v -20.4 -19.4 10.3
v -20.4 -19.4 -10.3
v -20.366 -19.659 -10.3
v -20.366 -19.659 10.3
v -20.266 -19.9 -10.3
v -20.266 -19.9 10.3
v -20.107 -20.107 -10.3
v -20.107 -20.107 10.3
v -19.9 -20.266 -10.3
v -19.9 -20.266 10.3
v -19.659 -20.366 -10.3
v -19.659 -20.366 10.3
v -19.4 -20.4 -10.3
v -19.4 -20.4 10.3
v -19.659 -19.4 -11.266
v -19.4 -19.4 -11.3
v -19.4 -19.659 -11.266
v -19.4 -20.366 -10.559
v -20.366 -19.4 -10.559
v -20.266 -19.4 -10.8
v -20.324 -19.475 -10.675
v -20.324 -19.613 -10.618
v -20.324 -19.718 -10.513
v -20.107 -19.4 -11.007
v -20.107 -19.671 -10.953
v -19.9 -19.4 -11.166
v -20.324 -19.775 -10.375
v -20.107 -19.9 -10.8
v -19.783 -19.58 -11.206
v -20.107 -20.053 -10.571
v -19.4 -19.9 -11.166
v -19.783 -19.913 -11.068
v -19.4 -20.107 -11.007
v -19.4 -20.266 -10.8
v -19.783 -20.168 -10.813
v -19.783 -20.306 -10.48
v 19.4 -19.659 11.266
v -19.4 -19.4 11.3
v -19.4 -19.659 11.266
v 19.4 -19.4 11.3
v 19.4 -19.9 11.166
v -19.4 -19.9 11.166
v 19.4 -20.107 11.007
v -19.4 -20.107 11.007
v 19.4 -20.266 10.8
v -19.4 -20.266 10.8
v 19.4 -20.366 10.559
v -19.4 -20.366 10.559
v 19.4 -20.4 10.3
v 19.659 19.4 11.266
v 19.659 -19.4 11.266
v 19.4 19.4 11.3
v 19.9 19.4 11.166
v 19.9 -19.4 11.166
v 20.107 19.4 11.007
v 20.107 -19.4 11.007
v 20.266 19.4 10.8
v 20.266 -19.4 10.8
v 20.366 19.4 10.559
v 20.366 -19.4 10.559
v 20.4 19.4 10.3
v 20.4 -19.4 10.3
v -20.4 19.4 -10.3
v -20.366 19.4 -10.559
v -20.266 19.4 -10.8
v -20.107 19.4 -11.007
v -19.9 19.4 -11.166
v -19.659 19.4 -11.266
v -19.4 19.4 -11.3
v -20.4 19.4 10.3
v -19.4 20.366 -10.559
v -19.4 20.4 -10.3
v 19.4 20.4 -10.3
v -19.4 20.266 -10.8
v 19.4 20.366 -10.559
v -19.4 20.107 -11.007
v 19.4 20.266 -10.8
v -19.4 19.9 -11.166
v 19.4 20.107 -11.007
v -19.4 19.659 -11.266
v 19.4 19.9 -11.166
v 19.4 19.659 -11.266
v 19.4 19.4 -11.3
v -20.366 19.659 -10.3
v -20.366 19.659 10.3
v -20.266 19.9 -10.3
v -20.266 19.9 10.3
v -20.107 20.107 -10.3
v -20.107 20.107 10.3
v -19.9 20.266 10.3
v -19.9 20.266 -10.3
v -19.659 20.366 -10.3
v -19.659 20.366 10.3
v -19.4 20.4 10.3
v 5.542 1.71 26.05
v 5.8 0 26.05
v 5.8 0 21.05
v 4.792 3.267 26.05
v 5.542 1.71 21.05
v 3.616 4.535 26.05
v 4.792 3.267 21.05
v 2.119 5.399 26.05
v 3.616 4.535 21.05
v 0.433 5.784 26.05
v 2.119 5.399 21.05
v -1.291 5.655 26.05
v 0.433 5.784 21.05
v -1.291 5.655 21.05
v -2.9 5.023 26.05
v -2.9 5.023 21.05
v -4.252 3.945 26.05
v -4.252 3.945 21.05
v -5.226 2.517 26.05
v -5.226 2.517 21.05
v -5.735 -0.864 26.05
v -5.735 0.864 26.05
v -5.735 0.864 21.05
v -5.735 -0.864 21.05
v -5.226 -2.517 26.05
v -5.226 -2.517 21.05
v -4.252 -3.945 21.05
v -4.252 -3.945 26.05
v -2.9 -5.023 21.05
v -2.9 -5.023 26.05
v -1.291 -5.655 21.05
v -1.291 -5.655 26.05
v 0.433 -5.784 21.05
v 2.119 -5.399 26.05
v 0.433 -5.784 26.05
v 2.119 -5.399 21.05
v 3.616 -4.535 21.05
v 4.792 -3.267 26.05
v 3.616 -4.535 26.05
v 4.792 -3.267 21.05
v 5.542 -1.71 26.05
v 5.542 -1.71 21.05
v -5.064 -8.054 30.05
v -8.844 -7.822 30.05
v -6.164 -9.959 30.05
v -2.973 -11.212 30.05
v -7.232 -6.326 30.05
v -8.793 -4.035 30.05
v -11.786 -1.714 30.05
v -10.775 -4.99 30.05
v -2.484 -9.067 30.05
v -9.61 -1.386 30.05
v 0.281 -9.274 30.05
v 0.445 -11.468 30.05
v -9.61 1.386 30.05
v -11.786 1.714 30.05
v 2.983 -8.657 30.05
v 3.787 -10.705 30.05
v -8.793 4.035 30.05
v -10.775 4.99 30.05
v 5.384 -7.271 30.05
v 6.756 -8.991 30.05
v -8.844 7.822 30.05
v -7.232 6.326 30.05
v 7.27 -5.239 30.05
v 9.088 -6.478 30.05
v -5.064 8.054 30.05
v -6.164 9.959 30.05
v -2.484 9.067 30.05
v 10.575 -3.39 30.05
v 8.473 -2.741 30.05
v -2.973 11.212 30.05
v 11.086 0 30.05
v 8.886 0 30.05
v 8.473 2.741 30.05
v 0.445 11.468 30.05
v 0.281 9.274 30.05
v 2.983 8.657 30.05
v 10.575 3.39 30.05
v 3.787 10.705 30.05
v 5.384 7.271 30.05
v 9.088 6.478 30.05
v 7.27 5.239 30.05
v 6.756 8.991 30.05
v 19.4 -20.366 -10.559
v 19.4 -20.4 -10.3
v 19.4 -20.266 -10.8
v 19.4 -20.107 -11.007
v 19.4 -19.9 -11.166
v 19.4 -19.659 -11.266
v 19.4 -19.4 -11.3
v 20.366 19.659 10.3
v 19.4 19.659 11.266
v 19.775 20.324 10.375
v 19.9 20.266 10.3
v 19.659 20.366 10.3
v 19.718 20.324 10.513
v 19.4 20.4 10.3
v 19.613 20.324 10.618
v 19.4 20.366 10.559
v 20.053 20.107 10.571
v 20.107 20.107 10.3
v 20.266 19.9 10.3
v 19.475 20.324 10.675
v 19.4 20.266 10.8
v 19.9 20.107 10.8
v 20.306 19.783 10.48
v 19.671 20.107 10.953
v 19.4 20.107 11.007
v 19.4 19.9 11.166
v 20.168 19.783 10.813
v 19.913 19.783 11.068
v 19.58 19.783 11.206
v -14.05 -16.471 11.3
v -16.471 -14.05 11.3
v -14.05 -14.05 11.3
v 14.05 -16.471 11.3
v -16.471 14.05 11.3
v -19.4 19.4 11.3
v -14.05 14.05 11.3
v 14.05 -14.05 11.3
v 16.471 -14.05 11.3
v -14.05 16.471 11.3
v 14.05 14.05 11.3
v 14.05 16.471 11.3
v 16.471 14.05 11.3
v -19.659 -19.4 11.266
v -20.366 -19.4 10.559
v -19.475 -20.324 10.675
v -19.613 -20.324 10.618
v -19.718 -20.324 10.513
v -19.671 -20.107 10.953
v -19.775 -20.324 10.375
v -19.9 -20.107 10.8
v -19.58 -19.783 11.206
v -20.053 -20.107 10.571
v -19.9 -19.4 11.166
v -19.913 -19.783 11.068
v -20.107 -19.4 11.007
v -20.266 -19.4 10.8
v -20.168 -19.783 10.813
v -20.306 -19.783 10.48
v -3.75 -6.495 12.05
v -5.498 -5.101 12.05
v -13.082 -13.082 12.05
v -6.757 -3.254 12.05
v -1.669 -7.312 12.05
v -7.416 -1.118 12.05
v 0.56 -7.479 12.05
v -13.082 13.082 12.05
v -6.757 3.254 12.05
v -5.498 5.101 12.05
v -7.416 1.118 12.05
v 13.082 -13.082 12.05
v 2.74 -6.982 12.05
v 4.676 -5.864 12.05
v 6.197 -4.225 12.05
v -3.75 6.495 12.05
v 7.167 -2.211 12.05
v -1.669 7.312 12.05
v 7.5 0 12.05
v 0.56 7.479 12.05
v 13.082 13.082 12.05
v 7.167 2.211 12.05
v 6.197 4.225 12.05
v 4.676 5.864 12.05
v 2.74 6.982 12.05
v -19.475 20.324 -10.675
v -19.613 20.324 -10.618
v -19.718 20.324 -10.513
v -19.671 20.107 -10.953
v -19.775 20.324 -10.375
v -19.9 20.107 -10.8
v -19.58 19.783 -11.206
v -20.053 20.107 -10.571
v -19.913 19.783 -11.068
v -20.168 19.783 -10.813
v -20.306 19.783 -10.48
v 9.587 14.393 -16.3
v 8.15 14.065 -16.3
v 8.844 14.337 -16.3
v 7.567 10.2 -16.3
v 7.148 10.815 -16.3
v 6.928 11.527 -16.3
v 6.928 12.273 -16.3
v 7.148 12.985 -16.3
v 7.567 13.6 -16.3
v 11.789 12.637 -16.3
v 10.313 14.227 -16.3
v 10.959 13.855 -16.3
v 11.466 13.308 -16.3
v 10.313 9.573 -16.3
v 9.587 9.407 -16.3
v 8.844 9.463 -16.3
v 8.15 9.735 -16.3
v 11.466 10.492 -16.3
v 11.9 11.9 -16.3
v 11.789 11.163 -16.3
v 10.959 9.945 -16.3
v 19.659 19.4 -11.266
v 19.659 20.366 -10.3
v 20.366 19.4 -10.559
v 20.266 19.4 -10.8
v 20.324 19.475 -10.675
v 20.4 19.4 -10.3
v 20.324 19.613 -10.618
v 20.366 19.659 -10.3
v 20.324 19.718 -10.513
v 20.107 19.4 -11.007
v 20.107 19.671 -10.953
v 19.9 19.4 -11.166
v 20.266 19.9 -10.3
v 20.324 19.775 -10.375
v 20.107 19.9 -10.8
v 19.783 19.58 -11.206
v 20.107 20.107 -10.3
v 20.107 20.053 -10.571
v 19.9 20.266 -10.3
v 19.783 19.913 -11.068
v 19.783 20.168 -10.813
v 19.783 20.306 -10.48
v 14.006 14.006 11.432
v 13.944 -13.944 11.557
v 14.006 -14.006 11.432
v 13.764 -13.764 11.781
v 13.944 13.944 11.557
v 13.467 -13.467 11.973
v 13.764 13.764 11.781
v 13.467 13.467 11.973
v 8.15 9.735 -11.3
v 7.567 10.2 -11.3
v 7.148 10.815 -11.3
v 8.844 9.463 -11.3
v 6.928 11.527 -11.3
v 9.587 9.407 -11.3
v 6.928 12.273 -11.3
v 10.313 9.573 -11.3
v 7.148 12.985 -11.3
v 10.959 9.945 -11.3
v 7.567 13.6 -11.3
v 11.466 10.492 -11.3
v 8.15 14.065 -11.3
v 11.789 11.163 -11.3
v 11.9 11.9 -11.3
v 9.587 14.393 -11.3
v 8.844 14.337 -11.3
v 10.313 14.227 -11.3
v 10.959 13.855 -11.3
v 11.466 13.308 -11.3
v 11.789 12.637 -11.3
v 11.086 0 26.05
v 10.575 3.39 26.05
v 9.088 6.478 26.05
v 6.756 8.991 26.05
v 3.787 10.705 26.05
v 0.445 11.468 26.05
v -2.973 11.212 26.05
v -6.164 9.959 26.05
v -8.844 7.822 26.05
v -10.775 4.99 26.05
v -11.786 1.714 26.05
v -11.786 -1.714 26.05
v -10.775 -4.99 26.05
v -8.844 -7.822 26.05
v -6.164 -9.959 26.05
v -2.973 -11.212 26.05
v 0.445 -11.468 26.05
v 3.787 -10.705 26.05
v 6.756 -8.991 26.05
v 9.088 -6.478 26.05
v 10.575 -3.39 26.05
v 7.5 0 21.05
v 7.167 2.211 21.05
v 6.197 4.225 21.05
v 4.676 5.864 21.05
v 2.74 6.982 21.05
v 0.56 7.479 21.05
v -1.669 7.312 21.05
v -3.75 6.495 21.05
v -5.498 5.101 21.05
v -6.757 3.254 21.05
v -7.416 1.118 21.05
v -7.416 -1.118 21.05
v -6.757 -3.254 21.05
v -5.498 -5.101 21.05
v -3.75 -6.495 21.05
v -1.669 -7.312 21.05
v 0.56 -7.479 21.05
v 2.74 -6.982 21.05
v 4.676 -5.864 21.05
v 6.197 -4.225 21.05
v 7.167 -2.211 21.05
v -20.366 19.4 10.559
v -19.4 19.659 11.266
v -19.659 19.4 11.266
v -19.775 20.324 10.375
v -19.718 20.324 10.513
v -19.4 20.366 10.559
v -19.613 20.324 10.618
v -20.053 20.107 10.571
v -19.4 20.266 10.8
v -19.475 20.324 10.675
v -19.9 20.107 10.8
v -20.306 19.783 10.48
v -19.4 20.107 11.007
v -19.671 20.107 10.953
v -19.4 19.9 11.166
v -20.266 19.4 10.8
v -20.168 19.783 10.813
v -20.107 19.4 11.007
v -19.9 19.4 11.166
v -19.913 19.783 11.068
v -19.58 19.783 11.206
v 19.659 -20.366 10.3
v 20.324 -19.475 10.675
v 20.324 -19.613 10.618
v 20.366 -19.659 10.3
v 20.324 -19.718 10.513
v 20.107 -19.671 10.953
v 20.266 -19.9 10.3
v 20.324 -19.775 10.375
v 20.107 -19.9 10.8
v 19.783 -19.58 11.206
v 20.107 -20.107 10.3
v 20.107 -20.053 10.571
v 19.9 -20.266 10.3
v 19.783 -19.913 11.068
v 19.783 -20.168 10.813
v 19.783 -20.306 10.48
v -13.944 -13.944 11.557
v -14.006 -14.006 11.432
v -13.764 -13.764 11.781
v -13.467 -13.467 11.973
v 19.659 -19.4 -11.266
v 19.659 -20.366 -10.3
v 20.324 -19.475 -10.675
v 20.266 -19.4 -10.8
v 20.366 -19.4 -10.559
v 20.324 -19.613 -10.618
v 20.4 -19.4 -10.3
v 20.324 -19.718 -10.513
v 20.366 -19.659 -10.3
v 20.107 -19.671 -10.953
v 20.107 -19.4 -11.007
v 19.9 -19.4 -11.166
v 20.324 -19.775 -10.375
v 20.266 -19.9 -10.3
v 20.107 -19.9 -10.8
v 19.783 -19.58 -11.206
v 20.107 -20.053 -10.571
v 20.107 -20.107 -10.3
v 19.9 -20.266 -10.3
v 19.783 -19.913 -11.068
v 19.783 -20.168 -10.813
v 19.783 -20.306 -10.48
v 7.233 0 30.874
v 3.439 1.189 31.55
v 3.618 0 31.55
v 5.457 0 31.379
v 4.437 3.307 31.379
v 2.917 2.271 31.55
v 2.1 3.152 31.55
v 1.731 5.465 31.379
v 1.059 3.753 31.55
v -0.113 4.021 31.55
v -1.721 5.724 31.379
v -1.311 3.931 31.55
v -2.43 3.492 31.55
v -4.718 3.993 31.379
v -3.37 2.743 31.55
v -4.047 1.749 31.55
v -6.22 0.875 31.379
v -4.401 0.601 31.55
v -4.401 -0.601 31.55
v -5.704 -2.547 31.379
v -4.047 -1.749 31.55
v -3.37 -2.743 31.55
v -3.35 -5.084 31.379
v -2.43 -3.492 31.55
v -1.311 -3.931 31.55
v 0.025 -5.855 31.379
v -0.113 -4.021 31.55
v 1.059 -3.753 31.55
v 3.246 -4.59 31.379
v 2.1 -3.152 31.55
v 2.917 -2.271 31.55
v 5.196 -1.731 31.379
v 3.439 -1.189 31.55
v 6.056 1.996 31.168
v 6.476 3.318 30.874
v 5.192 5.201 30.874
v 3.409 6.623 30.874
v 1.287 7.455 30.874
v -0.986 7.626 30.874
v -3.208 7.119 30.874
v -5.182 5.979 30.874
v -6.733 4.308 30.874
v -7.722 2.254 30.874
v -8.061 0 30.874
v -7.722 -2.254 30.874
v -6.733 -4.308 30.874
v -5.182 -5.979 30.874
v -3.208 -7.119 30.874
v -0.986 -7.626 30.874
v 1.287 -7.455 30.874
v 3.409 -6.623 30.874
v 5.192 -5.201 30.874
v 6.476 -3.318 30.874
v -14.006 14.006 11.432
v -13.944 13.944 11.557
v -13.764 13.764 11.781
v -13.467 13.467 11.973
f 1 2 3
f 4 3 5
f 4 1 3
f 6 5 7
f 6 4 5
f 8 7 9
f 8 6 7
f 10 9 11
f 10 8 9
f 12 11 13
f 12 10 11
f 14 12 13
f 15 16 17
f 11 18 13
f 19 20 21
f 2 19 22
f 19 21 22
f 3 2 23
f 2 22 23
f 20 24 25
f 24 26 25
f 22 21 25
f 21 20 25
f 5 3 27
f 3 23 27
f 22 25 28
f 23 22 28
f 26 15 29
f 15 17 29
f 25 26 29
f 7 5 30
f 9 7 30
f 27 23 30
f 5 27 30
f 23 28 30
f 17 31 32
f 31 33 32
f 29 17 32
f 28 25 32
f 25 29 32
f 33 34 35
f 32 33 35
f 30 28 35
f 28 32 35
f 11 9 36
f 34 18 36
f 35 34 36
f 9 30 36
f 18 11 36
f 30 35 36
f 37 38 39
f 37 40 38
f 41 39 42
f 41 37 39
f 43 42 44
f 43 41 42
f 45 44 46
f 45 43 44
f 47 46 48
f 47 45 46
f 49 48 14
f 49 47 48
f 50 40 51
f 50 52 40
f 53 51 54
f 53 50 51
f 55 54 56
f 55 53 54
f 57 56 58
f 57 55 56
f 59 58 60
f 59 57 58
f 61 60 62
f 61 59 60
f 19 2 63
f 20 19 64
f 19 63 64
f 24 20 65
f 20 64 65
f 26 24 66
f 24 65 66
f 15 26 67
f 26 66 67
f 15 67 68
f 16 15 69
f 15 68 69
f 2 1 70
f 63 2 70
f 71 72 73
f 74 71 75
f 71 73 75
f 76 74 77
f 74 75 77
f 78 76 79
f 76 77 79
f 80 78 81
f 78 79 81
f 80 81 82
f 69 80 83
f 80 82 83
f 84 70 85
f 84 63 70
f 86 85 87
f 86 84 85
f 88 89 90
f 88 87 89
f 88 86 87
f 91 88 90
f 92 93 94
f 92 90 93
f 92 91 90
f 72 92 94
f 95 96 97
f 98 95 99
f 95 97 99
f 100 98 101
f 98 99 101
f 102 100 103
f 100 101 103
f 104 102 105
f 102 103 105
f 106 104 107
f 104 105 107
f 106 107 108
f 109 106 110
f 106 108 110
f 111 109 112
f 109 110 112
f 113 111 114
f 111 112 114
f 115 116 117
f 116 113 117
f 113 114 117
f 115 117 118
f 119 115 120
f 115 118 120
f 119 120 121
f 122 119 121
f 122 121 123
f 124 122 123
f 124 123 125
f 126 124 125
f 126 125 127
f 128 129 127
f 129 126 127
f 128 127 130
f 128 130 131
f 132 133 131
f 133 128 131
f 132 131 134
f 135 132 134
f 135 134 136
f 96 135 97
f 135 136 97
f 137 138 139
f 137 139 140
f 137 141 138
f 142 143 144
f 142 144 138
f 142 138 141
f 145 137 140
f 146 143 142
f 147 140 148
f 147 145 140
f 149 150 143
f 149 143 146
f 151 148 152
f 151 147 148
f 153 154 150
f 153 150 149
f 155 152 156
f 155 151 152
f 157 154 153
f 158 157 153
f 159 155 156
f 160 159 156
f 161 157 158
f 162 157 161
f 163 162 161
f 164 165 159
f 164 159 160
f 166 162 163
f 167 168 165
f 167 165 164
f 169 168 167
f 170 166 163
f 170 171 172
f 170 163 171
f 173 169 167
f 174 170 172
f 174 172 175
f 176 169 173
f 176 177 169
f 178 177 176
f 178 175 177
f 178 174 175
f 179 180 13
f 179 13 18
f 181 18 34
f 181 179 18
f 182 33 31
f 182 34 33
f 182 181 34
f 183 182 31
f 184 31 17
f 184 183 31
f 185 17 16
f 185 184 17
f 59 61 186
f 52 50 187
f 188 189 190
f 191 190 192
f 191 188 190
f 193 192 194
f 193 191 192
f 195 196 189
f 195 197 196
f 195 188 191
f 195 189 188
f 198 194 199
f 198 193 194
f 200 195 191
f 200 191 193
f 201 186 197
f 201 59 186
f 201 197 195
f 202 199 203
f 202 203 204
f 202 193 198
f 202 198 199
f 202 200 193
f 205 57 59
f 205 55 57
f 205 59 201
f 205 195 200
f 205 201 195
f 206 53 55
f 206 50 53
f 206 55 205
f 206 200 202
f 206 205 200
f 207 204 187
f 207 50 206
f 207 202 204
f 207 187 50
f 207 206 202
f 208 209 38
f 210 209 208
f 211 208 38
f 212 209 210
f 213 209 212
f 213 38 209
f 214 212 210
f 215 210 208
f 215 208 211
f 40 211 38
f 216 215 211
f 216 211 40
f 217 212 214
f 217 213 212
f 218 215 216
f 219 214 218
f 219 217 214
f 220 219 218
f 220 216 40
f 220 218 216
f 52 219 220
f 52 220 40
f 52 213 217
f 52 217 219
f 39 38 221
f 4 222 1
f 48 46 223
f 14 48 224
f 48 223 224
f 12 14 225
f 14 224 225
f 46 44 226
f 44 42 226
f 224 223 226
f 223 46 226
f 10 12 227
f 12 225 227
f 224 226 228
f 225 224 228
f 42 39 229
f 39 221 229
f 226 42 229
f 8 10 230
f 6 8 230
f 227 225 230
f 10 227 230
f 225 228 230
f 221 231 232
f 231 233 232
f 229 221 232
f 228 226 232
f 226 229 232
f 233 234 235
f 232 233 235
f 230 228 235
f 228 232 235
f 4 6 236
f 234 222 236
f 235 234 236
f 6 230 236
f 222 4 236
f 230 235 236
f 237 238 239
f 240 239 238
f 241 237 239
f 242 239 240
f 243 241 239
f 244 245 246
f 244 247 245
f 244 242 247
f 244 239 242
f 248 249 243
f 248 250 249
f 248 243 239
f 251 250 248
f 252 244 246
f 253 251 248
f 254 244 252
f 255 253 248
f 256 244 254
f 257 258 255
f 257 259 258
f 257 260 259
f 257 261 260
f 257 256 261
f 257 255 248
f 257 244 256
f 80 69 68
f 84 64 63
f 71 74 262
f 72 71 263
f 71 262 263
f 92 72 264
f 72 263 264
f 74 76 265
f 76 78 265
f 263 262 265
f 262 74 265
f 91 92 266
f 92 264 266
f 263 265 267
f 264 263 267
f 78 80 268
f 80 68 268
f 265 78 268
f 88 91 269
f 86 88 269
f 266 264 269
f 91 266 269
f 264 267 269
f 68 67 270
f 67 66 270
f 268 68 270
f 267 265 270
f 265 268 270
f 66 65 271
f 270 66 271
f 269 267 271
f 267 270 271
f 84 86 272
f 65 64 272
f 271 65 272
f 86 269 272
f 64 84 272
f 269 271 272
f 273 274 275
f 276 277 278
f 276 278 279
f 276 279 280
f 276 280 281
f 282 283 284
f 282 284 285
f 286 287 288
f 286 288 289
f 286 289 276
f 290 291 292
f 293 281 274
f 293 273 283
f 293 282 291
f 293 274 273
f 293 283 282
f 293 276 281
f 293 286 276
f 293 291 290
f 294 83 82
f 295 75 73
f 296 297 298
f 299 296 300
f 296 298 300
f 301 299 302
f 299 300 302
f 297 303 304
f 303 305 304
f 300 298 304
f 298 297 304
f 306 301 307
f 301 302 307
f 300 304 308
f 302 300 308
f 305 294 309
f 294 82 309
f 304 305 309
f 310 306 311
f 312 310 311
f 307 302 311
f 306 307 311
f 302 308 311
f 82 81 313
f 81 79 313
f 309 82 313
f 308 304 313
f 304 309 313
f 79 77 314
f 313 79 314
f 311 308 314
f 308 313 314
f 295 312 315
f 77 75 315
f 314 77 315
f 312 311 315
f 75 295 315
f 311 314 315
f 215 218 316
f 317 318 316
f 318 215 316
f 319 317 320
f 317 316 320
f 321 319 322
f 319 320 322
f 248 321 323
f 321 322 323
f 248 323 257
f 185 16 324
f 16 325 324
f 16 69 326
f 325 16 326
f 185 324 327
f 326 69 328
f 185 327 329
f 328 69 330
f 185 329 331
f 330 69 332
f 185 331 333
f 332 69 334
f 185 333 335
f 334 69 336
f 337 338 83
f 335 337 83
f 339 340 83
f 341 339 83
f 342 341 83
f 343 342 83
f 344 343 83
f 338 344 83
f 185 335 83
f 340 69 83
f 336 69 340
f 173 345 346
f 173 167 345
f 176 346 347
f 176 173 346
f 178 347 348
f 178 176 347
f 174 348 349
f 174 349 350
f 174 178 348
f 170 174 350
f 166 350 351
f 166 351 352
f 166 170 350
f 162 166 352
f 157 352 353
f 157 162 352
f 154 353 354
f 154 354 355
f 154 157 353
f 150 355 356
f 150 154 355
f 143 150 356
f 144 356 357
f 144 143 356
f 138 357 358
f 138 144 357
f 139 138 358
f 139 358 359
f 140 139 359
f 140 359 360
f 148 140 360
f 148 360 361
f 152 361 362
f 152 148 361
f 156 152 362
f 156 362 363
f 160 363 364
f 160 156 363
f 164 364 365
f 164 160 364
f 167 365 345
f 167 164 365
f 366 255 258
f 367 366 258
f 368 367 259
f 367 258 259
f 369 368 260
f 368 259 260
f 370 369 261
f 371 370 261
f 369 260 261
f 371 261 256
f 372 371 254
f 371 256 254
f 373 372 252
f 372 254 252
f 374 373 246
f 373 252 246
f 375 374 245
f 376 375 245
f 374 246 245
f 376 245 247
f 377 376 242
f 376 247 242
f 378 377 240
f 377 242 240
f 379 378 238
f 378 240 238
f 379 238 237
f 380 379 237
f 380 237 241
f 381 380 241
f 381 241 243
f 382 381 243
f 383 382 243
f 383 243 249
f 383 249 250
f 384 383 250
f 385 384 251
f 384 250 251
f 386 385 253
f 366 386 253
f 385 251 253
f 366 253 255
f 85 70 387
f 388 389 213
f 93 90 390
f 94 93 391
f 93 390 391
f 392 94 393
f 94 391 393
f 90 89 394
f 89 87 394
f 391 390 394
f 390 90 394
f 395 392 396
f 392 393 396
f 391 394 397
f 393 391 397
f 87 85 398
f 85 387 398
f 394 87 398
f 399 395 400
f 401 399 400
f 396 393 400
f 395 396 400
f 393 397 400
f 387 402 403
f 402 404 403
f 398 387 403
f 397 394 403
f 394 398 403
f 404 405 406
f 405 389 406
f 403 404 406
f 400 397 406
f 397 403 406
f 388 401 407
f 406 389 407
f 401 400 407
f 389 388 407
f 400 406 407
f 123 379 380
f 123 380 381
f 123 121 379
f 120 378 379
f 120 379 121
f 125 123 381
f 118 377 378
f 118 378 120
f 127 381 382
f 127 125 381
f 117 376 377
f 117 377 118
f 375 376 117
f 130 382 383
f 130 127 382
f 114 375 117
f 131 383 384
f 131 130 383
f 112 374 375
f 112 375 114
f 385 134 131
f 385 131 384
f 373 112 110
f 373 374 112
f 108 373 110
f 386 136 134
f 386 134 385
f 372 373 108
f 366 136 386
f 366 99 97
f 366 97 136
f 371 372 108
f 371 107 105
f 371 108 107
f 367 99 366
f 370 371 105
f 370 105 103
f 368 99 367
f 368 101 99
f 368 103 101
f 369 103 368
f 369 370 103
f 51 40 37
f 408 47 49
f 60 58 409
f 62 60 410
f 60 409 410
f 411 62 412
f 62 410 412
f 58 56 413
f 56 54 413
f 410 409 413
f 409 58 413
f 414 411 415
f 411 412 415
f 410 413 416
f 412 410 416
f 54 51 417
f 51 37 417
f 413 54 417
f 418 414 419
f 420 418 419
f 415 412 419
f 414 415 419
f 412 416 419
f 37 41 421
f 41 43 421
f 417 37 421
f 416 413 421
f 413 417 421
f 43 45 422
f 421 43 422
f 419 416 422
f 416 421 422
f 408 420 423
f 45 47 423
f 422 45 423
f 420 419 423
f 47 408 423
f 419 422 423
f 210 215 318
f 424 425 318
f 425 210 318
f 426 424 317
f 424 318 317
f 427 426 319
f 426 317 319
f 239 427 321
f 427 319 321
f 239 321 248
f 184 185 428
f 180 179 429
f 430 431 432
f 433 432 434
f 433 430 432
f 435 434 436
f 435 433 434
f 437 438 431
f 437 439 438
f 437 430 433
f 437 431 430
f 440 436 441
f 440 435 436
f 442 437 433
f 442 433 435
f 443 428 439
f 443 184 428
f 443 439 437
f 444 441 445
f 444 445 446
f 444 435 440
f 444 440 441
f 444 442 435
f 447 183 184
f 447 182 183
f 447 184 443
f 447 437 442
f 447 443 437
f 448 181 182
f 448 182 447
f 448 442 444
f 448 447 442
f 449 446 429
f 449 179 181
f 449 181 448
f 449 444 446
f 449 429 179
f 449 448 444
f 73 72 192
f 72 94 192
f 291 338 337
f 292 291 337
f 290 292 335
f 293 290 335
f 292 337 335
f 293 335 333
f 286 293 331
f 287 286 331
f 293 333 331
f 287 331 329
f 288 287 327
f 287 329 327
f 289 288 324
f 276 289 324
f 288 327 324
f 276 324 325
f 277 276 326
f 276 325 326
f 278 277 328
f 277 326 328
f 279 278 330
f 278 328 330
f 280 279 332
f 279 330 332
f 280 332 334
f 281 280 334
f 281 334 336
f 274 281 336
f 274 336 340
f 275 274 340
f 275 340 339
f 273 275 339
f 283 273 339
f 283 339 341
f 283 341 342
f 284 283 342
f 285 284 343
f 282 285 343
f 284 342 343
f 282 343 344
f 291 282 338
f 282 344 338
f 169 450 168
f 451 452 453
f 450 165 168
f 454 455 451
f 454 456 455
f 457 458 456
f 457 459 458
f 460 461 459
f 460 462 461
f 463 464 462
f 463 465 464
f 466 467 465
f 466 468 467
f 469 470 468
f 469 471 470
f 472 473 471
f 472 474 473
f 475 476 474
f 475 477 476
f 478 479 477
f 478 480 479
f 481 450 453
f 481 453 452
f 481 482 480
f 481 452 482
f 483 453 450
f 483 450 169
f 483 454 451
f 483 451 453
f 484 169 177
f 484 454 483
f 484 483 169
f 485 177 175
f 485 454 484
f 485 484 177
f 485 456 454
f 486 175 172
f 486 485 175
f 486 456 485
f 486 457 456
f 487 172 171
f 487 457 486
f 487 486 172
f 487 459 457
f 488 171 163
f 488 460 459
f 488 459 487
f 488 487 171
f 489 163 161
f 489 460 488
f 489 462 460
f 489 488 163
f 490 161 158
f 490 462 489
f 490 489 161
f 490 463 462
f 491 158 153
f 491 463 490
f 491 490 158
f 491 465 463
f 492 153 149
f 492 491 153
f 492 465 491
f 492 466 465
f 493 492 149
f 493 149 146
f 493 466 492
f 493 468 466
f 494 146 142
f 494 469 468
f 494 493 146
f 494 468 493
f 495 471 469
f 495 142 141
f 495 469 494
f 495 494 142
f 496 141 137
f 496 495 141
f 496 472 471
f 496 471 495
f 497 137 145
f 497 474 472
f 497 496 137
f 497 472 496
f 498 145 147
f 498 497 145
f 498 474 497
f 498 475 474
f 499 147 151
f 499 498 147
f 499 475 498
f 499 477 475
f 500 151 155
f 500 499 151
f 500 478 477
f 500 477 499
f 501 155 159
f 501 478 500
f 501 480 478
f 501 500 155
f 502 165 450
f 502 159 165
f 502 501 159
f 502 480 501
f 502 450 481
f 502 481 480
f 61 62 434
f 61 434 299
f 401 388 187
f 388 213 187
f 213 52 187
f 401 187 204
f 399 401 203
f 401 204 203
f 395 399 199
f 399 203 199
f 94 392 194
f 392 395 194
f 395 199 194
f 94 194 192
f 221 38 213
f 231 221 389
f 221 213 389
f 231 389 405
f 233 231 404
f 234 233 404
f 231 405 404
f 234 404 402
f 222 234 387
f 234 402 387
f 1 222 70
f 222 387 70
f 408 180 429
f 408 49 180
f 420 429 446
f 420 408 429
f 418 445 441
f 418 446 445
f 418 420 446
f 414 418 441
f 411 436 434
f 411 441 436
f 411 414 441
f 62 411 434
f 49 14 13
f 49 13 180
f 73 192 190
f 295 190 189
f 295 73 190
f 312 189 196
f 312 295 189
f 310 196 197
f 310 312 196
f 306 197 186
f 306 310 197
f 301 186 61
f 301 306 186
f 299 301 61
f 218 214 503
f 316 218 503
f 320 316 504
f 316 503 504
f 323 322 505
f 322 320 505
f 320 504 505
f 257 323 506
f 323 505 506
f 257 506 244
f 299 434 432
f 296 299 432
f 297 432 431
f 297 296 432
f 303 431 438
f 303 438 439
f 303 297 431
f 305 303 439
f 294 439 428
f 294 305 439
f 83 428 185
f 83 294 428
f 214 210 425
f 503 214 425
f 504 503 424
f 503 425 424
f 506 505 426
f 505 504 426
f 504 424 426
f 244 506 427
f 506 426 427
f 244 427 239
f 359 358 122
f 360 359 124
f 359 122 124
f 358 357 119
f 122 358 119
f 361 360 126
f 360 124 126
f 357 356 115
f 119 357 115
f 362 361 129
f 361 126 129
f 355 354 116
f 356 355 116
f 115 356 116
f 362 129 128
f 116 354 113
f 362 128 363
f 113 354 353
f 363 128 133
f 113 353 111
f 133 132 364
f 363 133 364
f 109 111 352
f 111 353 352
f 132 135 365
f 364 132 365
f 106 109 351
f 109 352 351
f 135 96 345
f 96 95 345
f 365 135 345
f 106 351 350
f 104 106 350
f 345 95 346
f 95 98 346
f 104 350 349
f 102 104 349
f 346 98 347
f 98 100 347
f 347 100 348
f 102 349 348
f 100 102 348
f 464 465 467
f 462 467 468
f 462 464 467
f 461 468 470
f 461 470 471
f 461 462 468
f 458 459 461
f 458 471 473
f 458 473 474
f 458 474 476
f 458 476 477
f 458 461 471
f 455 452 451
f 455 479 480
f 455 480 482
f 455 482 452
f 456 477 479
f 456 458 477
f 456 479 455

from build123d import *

# Parameters (mm, degrees)
CROQUIS1_W              = 40.8
CROQUIS1_H              = 40.8
SALIENTE_EXTRUIR1_DEPTH = 11.3
CROQUIS2_W              = 28.1
CROQUIS2_H              = 28.1
SALIENTE_EXTRUIR2_DEPTH = 0.75
REDONDEO1_R             = 1
CROQUIS3_R              = 7.5
SALIENTE_EXTRUIR3_DEPTH = 9
CROQUIS4_R              = 5.8
SALIENTE_EXTRUIR4_DEPTH = 7
CROQUIS5_R              = 11.5
SALIENTE_EXTRUIR5_DEPTH = 2
CROQUIS6_R              = 9.3
SALIENTE_EXTRUIR6_DEPTH = 1.5
REDONDEO4_R             = 10
CROQUIS7_R              = 2.5
SALIENTE_EXTRUIR7_DEPTH = 5
REDONDEO5_R             = 1


with BuildPart() as part:
    # Croquis1 → Saliente-Extruir1 (new, symmetric)
    with BuildSketch(Plane.XY):
        Rectangle(CROQUIS1_W, CROQUIS1_H)
    extrude(amount=SALIENTE_EXTRUIR1_DEPTH, both=True)

    # Croquis2 → Saliente-Extruir2 (add, symmetric)
    with BuildSketch(Plane.XY.offset(11.3)):
        Rectangle(CROQUIS2_W, CROQUIS2_H)
    extrude(amount=SALIENTE_EXTRUIR2_DEPTH, both=True)

    # Redondeo1
    # the kernel refuses this fillet: 1 mm, written as the material it takes off along each edge
    with BuildSketch(Plane(origin=(14.05, 16.470614591, 12.05), x_dir=(0, 0, -1), z_dir=(0, -1, 0)), Plane(origin=(-16.470614591, 14.05, 12.05), x_dir=(0, 0, -1), z_dir=(1, 0, 0)), Plane(origin=(16.470614591, -14.05, 12.05), x_dir=(0, 0, -1), z_dir=(-1, 0, 0)), Plane(origin=(-14.05, -16.470614591, 12.05), x_dir=(0, 0, -1), z_dir=(0, 1, 0))) as redondeo1_piece_1:
        with BuildLine():
            CenterArc((1, -0.968245837), REDONDEO1_R, 104.477512186, 75.522487814)
            Line((0, -0.968245837), (-0.02, -0.968245837))
            Line((-0.02, -0.968245837), (-0.02, 0))
            Line((-0.02, 0), (0, 0.02))
            ThreePointArc((0, 0.02), (0.375, 0.02), (0.745, 0.019364917))
            Line((0.745, 0.019364917), (0.75, 0))
        make_face()
    extrude(amount=32.941229183, mode=Mode.SUBTRACT)

    # Croquis3 → Saliente-Extruir3 (add)
    with BuildSketch(Plane.XY.offset(12.05)):
        Circle(CROQUIS3_R)
    extrude(amount=SALIENTE_EXTRUIR3_DEPTH)

    # Croquis4 → Saliente-Extruir4 (add)
    with BuildSketch(Plane.XY.offset(21.05)):
        Circle(CROQUIS4_R)
    extrude(amount=SALIENTE_EXTRUIR4_DEPTH)

    # Croquis5 → Saliente-Extruir5 (add, symmetric)
    with BuildSketch(Plane.XY.offset(28.05)):
        with Locations((-0.414239482, 0)):
            Circle(CROQUIS5_R)
    extrude(amount=SALIENTE_EXTRUIR5_DEPTH, both=True)

    # Croquis6 → Saliente-Extruir6 (add, symmetric)
    with BuildSketch(Plane.XY.offset(30.05)):
        with Locations((-0.414239482, 0)):
            Circle(CROQUIS6_R)
    extrude(amount=SALIENTE_EXTRUIR6_DEPTH, both=True)

    # Redondeo4
    # the kernel refuses this fillet: 10 mm, written as the material it takes off along each edge
    with BuildSketch(Plane(origin=(-0.414239482, 0, 31.55), x_dir=(1, 0, 0), z_dir=(0, -1, 0))) as redondeo4_piece_1:
        with BuildLine():
            CenterArc((4.032173124, -10), REDONDEO4_R, 58.211669383, 31.788330617)
            Line((4.032173124, 0), (4.032173124, 0.2))
            Line((4.032173124, 0.2), (9.3, 0.2))
            Line((9.3, 0.2), (9.5, 0))
            ThreePointArc((9.5, 0), (9.5, -0.75), (9.405356538, -1.33))
            Line((9.405356538, -1.33), (9.3, -1.5))
        make_face()
    revolve(axis=Axis((-0.414239482, 0, 31.55), (0, 0, 1)), mode=Mode.SUBTRACT)

    # Croquis7 → Saliente-Extruir7 (add)
    with BuildSketch(Plane(origin=(0, 0, -11.3), x_dir=(-1, 0, 0), z_dir=(0, 0, -1))):
        with Locations(Location((-9.4, 11.9, 0), (0, 0, 180))):
            Circle(CROQUIS7_R)
    extrude(amount=SALIENTE_EXTRUIR7_DEPTH)

    # Redondeo5
    redondeo5_edges = [part.edges().sort_by_distance(p)[0] for p in [
        (-20.4, 0, 11.3),
        (0, -20.4, 11.3),
        (20.4, 0, 11.3),
        (0, -20.4, -11.3),
        (-20.4, 0, -11.3),
        (0, 20.4, -11.3),
        (20.4, 0, -11.3),
        (20.4, -20.4, 0),
        (-20.4, -20.4, 0),
        (-20.4, 20.4, 0),
        (20.4, 20.4, 0),
        (0, 20.4, 11.3),
    ]]
    fillet(redondeo5_edges, radius=REDONDEO5_R)


solid = part.part
